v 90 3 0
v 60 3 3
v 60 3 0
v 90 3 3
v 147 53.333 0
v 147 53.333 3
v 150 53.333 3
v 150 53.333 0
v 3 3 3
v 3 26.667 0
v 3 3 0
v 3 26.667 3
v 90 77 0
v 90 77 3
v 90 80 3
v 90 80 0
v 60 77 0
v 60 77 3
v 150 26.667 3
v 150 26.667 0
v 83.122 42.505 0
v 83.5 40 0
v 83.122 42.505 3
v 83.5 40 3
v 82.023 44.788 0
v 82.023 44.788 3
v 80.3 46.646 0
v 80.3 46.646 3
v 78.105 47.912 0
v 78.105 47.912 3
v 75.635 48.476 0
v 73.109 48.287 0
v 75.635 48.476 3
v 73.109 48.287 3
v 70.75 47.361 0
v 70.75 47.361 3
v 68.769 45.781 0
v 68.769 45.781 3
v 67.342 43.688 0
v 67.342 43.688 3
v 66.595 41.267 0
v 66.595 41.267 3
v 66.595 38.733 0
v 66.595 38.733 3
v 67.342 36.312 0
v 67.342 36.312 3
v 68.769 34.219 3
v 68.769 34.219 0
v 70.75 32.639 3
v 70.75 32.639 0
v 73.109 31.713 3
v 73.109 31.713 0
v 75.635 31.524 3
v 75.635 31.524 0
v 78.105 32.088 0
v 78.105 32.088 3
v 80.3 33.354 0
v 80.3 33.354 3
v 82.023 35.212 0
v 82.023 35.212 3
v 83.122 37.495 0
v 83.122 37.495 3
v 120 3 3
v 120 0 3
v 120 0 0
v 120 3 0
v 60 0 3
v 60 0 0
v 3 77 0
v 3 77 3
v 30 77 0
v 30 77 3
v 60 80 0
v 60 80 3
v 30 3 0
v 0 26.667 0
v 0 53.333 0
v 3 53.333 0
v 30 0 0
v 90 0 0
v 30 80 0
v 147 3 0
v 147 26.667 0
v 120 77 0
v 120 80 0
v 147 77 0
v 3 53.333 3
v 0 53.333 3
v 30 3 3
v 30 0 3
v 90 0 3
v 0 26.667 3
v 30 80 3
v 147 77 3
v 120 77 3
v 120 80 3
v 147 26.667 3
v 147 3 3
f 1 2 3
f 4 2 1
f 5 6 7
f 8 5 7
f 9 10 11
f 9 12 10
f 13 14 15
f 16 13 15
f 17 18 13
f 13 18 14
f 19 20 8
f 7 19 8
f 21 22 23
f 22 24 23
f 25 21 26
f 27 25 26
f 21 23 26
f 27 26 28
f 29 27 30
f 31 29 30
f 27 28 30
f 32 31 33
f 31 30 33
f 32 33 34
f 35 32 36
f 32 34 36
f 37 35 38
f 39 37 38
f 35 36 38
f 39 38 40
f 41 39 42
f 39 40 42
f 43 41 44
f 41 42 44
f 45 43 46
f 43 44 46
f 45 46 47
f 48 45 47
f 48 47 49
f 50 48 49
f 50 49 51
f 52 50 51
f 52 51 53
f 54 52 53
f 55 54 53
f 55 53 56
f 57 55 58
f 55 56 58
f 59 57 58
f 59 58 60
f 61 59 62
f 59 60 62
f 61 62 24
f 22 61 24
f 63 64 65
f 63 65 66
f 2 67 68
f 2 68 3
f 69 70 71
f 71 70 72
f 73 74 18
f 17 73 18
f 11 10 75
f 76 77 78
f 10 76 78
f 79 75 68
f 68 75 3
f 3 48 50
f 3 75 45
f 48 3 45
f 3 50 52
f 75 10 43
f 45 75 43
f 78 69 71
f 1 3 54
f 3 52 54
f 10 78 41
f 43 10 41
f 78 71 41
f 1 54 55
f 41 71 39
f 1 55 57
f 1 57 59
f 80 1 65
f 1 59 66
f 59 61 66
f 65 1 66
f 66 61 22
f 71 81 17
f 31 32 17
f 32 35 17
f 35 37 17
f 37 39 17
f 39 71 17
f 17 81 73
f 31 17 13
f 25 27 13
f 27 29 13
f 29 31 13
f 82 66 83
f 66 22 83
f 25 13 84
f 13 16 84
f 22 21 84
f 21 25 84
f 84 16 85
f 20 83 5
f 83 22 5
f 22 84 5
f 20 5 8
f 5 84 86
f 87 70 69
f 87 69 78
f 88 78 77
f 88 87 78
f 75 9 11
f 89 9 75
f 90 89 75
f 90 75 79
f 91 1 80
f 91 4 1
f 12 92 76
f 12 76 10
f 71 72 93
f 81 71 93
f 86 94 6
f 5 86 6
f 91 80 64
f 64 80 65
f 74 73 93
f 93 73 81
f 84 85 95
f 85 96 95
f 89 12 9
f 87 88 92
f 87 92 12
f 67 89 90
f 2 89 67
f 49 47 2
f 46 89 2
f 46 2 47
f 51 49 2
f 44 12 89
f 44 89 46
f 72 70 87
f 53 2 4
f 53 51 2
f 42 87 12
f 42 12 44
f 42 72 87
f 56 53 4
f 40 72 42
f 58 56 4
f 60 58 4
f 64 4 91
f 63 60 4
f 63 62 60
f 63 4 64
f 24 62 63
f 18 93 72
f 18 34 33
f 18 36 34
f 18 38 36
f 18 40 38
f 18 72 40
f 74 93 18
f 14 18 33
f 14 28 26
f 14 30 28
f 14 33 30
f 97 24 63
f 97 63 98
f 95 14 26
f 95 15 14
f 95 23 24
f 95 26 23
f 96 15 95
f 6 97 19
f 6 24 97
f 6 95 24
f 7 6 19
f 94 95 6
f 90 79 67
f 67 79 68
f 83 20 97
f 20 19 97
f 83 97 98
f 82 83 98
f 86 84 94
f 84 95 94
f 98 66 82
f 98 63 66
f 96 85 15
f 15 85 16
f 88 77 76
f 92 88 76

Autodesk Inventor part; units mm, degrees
ref_plane "YZ Plane" through (0, 0, 0) normal (1, 0, 0) x (0, 1, 0)
ref_plane "XZ Plane" through (0, 0, 0) normal (0, 1, 0) x (-1, 0, 0)
ref_plane "XY Plane" through (0, 0, 0) normal (0, 0, 1) x (1, 0, 0)
sketch "Sketch1" plane through (0, 0, 0) normal (0, 0, 1) x (1, 0, 0)
  line L0 (0, 0) -> (150, 0)
  line L1 (150, 0) -> (150, 80)
  line L2 (150, 80) -> (0, 80)
  line L3 (0, 80) -> (0, 0)
  dimension "d0" = 150
  dimension "d1" = 80
extrude "Extrusion1" add sketch "Sketch1" along normal blind 3
sketch "Sketch2" plane through (0, 0, 3) normal (0, 0, 1) x (1, 0, 0)
  line L0 (0, 80) -> (0, 0)
  line L1 (150, 0) -> (150, 80)
  line L2 (3, 80) -> (3, 53.3333)
  line L3 (3, 53.3333) -> (0, 53.3333)
  line L4 (0, 53.3333) -> (0, 26.6667)
  line L5 (0, 26.6667) -> (3, 26.6667)
  line L6 (3, 26.6667) -> (3, 0)
  line L7 (0, 80) -> (0, 53.3333)
  line L8 (0, 26.6667) -> (0, 0)
  line L9 (147, 80) -> (147, 53.3333)
  line L10 (147, 53.3333) -> (150, 53.3333)
  line L11 (150, 53.3333) -> (150, 26.6667)
  line L12 (150, 26.6667) -> (147, 26.6667)
  line L13 (147, 26.6667) -> (147, 0)
  line L14 (150, 0) -> (150, 26.6667)
  line L15 (150, 53.3333) -> (150, 80)
  line L16 (0, 26.6667) -> (0, 0)
  line L17 (0, 0) -> (0, 3)
  line L18 (0, 3) -> (30, 3)
  line L19 (30, 3) -> (30, 0)
  line L20 (30, 0) -> (60, 0)
  line L21 (0, 0) -> (150, 0)
  line L22 (60, 0) -> (60, 3)
  line L23 (60, 3) -> (90, 3)
  line L24 (90, 3) -> (90, 0)
  line L25 (90, 0) -> (120, 0)
  line L26 (120, 0) -> (120, 3)
  line L27 (120, 3) -> (150, 3)
  line L28 (0, 80) -> (0, 77)
  line L29 (0, 77) -> (30, 77)
  line L30 (30, 77) -> (30, 80)
  line L31 (60, 80) -> (60, 77)
  line L32 (30, 80) -> (60, 80)
  line L33 (0, 80) -> (150, 80)
  line L34 (60, 77) -> (90, 77)
  line L35 (90, 77) -> (90, 80)
  line L36 (120, 80) -> (120, 77)
  line L37 (120, 77) -> (150, 77)
  line L38 (90, 80) -> (120, 80)
  line L39 (0, 0) -> (30, 0)
  line L40 (0, 0) -> (150, 0) projected
  line L41 (120, 0) -> (150, 0)
  line L42 (150, 0) -> (150, 80) projected
  line L43 (150, 80) -> (120, 80)
  line L44 (150, 80) -> (0, 80) projected
  line L45 (30, 80) -> (0, 80)
  dimension "d4" = 3
  dimension "d5" = 26.6667
  dimension "d6" = 26.6667
  dimension "d7" = 3
  dimension "d8" = 26.6667
  dimension "d9" = 26.6667
  dimension "d10" = 3
  dimension "d11" = 30
  dimension "d12" = 30
  dimension "d13" = 30
  dimension "d14" = 30
extrude "Extrusion2" cut sketch "Sketch2" against normal blind 3 contours L33 L2 L29 L0 | L29 L2 L3 L0 | L33 L30 L29 L2 | L5 L6 L18 L0 | L33 L35 L34 L31 | L18 L6 L21 L0 | L18 L19 L21 L6 | L33 L9 L37 L36 | L33 L1 L37 L9 | L37 L1 L10 L9 | L22 L23 L24 L21 | L26 L27 L13 L21 | L1 L27 L13 L12 | L13 L27 L1 L21
sketch "Sketch3" plane through (0, 0, 3) normal (0, 0, 1) x (1, 0, 0)
  line L0 (60, 77) -> (90, 77) projected
  line L1 (90, 3) -> (60, 3) projected
  circle A0 centre (75, 40) radius 8.5
  point P0 (0, 0)
  dimension "d17" = 17
extrude "Extrusion3" cut sketch "Sketch3" against normal blind 3
properties part number "TAPA3"
